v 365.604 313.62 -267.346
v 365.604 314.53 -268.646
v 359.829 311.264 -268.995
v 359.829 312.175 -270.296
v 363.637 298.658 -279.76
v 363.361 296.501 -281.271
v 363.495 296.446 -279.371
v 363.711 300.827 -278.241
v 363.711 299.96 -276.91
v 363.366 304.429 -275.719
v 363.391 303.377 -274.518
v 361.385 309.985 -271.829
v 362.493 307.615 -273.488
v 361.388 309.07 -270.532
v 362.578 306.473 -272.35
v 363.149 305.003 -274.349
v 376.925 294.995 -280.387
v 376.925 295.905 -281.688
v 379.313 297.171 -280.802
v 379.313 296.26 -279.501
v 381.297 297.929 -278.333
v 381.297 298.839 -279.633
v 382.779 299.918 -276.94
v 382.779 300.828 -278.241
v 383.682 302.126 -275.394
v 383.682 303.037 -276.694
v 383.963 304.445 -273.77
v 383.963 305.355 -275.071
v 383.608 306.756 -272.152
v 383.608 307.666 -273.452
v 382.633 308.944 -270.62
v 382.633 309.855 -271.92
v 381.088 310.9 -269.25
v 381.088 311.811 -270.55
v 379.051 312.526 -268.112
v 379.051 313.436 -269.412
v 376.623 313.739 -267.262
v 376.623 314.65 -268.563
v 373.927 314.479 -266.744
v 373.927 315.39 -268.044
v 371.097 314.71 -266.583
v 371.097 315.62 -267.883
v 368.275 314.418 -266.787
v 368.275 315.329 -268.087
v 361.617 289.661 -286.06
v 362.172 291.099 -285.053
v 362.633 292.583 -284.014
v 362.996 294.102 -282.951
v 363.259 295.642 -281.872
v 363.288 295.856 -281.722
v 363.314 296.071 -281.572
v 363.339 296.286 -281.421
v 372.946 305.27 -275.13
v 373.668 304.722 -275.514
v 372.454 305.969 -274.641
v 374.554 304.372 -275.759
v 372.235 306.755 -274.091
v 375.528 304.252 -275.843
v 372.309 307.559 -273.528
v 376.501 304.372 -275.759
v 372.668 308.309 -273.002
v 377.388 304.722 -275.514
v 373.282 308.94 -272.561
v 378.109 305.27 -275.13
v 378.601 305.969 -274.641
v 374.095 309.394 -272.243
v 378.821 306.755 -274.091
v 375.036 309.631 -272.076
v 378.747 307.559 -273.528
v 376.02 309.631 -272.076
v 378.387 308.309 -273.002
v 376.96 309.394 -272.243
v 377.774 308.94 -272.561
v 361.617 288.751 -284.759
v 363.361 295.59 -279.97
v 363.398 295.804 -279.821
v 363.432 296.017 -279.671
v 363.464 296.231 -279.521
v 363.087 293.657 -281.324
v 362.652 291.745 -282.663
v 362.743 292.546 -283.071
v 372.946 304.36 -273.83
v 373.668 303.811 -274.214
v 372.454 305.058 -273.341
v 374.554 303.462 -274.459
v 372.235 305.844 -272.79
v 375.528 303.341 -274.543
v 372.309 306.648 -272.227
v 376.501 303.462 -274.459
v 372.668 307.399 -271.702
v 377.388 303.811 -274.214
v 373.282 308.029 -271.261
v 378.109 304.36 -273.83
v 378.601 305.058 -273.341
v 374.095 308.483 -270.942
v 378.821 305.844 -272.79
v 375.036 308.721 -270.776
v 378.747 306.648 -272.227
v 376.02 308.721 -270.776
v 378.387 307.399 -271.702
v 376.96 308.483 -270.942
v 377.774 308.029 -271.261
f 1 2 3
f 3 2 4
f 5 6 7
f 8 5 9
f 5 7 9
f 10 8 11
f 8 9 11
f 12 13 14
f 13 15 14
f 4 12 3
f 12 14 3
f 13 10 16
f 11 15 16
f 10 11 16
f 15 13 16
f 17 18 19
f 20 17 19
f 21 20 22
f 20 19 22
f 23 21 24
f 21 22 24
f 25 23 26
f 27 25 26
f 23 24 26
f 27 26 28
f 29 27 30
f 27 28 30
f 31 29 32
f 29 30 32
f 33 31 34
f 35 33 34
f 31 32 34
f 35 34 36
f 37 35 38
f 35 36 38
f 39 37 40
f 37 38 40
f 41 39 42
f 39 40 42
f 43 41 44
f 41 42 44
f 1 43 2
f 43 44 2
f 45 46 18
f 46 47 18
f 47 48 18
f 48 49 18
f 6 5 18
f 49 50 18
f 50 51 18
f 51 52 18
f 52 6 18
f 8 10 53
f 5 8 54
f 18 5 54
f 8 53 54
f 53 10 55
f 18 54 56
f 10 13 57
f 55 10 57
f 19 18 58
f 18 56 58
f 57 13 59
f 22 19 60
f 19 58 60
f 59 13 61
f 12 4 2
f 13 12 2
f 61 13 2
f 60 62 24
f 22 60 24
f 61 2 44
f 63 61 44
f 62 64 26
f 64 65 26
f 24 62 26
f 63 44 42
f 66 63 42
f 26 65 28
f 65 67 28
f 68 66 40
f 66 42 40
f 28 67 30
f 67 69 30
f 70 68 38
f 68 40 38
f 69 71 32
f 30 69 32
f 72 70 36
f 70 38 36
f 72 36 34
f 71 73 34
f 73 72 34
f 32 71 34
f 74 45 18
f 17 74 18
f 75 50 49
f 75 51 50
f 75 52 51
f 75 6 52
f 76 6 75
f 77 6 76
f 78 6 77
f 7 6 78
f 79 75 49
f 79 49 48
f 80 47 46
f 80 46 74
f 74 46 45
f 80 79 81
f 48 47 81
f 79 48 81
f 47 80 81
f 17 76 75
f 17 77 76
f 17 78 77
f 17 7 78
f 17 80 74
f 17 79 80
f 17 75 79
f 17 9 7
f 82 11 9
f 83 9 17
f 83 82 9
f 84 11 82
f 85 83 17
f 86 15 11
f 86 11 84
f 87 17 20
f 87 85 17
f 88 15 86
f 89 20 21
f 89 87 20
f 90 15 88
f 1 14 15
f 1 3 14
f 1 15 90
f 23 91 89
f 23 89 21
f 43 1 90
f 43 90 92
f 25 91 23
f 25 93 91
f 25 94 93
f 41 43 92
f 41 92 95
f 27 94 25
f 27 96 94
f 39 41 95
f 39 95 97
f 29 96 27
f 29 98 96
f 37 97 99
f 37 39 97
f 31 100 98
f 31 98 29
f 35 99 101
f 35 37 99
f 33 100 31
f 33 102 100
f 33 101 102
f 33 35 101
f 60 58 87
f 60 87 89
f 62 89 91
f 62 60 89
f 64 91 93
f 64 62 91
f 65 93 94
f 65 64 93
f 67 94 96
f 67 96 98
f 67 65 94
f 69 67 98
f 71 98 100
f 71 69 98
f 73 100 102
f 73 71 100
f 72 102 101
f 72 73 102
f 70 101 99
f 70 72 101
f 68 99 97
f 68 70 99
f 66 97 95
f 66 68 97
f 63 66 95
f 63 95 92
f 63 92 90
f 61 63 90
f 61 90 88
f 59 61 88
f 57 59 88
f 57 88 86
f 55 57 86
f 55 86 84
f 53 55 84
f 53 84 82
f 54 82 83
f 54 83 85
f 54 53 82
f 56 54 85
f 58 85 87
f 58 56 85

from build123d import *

# Parameters (mm, degrees)
SKETCH1_R           = 3.3020000000000405
BOSS_EXTRUDE1_DEPTH = 1.5875
SKETCH2_R           = 12.7
CUT_EXTRUDE1_DEPTH  = 164.69798740092241
CUT_EXTRUDE2_DEPTH  = 399.2312021708926
CUT_EXTRUDE3_DEPTH  = 399.2322845032196


with BuildPart() as part:
    # Sketch1 → Boss-Extrude1 (new body)
    with BuildSketch(Plane(origin=(-4.904e-14, 229.6997332170858, -328.0452161431734), x_dir=(1, 7e-17, -1e-16), z_dir=(0, -0.5735764363510497, 0.8191520442889892))):
        with BuildLine():
            Line((356.2998896252525, 70.55163741306428), (376.9254322382814, 80.82199071424783))
            ThreePointArc((376.9254322382814, 80.82199071424783), (382.63309358192566, 97.85145347695013), (365.6036308192234, 103.55911482059432))
            Line((365.6036308192234, 103.55911482059432), (344.97808820619434, 93.28876151941097))
            Line((344.97808820619434, 93.28876151941097), (356.2998896252525, 70.55163741306428))
        make_face()
        with Locations(Location((375.5277422986924, 94.3133905334945, 0), (0, 0, 270))):
            Circle(SKETCH1_R, mode=Mode.SUBTRACT)
    extrude(amount=BOSS_EXTRUDE1_DEPTH)

    # Sketch2 → Cut-Extrude1 (cut, through all)
    with BuildSketch(Plane(origin=(364.35174229869244, 343.62540364794484, -135.39966553044988), x_dir=(-0.9960075449626111, 0.027318171664055604, 0.08498639817338811), z_dir=(-0.0892690897094424, -0.3047987291070713, -0.9482240053685426))):
        Circle(SKETCH2_R)
    extrude(amount=CUT_EXTRUDE1_DEPTH, mode=Mode.SUBTRACT)

    # Sketch3 → Cut-Extrude2 (cut, through all)
    with BuildSketch(Plane(origin=(-4.885e-14, 228.78918062437845, -326.7448122728647), x_dir=(1, 7e-17, -1e-16), z_dir=(0, -0.5735764363510497, 0.8191520442889892))):
        with BuildLine():
            Line((359.8287026568516, 100.68352732070262), (358.4382239247449, 99.99114758047237))
            Line((358.4382239247449, 99.99114758047237), (360.8702636019665, 72.82742507790554))
            add(Edge.make_bspline(
                [(360.8702636019665, 72.82742507790554), (368.2083080665997, 89.03003410456597), (359.8287026568516, 100.68352732070262)],
                knots=[4.218717035603661, 4.218717035603661, 4.218717035603661, 5.696136664554478, 5.696136664554478, 5.696136664554478], degree=2, weights=[1, 0.7393379003717987, 1]))
        make_face()
    extrude(amount=-CUT_EXTRUDE2_DEPTH, mode=Mode.SUBTRACT)

    # Sketch4 → Cut-Extrude3 (cut, through all)
    with BuildSketch(Plane(origin=(-4.904e-14, 229.6997332170858, -328.0452161431734), x_dir=(-1, -7e-17, 1e-16), z_dir=(0, 0.5735764363510497, -0.8191520442889892))):
        with BuildLine():
            Line((-361.6174533376439, 73.19948329292563), (-360.8702636019665, 72.82742507790549))
            Line((-360.8702636019665, 72.82742507790549), (-363.361378453228, 81.54873685940132))
            add(Edge.make_bspline(
                [(-363.361378453228, 81.54873685940132), (-363.00233152155374, 77.177344146135), (-361.6174533376439, 73.19948329292563)],
                knots=[1.5208655376076283, 1.5208655376076283, 1.5208655376076283, 1.9311023959162479, 1.9311023959162479, 1.9311023959162479], degree=2, weights=[1, 0.9790368693670761, 1]))
        make_face()
    extrude(amount=-CUT_EXTRUDE3_DEPTH, mode=Mode.SUBTRACT)


solid = part.part
